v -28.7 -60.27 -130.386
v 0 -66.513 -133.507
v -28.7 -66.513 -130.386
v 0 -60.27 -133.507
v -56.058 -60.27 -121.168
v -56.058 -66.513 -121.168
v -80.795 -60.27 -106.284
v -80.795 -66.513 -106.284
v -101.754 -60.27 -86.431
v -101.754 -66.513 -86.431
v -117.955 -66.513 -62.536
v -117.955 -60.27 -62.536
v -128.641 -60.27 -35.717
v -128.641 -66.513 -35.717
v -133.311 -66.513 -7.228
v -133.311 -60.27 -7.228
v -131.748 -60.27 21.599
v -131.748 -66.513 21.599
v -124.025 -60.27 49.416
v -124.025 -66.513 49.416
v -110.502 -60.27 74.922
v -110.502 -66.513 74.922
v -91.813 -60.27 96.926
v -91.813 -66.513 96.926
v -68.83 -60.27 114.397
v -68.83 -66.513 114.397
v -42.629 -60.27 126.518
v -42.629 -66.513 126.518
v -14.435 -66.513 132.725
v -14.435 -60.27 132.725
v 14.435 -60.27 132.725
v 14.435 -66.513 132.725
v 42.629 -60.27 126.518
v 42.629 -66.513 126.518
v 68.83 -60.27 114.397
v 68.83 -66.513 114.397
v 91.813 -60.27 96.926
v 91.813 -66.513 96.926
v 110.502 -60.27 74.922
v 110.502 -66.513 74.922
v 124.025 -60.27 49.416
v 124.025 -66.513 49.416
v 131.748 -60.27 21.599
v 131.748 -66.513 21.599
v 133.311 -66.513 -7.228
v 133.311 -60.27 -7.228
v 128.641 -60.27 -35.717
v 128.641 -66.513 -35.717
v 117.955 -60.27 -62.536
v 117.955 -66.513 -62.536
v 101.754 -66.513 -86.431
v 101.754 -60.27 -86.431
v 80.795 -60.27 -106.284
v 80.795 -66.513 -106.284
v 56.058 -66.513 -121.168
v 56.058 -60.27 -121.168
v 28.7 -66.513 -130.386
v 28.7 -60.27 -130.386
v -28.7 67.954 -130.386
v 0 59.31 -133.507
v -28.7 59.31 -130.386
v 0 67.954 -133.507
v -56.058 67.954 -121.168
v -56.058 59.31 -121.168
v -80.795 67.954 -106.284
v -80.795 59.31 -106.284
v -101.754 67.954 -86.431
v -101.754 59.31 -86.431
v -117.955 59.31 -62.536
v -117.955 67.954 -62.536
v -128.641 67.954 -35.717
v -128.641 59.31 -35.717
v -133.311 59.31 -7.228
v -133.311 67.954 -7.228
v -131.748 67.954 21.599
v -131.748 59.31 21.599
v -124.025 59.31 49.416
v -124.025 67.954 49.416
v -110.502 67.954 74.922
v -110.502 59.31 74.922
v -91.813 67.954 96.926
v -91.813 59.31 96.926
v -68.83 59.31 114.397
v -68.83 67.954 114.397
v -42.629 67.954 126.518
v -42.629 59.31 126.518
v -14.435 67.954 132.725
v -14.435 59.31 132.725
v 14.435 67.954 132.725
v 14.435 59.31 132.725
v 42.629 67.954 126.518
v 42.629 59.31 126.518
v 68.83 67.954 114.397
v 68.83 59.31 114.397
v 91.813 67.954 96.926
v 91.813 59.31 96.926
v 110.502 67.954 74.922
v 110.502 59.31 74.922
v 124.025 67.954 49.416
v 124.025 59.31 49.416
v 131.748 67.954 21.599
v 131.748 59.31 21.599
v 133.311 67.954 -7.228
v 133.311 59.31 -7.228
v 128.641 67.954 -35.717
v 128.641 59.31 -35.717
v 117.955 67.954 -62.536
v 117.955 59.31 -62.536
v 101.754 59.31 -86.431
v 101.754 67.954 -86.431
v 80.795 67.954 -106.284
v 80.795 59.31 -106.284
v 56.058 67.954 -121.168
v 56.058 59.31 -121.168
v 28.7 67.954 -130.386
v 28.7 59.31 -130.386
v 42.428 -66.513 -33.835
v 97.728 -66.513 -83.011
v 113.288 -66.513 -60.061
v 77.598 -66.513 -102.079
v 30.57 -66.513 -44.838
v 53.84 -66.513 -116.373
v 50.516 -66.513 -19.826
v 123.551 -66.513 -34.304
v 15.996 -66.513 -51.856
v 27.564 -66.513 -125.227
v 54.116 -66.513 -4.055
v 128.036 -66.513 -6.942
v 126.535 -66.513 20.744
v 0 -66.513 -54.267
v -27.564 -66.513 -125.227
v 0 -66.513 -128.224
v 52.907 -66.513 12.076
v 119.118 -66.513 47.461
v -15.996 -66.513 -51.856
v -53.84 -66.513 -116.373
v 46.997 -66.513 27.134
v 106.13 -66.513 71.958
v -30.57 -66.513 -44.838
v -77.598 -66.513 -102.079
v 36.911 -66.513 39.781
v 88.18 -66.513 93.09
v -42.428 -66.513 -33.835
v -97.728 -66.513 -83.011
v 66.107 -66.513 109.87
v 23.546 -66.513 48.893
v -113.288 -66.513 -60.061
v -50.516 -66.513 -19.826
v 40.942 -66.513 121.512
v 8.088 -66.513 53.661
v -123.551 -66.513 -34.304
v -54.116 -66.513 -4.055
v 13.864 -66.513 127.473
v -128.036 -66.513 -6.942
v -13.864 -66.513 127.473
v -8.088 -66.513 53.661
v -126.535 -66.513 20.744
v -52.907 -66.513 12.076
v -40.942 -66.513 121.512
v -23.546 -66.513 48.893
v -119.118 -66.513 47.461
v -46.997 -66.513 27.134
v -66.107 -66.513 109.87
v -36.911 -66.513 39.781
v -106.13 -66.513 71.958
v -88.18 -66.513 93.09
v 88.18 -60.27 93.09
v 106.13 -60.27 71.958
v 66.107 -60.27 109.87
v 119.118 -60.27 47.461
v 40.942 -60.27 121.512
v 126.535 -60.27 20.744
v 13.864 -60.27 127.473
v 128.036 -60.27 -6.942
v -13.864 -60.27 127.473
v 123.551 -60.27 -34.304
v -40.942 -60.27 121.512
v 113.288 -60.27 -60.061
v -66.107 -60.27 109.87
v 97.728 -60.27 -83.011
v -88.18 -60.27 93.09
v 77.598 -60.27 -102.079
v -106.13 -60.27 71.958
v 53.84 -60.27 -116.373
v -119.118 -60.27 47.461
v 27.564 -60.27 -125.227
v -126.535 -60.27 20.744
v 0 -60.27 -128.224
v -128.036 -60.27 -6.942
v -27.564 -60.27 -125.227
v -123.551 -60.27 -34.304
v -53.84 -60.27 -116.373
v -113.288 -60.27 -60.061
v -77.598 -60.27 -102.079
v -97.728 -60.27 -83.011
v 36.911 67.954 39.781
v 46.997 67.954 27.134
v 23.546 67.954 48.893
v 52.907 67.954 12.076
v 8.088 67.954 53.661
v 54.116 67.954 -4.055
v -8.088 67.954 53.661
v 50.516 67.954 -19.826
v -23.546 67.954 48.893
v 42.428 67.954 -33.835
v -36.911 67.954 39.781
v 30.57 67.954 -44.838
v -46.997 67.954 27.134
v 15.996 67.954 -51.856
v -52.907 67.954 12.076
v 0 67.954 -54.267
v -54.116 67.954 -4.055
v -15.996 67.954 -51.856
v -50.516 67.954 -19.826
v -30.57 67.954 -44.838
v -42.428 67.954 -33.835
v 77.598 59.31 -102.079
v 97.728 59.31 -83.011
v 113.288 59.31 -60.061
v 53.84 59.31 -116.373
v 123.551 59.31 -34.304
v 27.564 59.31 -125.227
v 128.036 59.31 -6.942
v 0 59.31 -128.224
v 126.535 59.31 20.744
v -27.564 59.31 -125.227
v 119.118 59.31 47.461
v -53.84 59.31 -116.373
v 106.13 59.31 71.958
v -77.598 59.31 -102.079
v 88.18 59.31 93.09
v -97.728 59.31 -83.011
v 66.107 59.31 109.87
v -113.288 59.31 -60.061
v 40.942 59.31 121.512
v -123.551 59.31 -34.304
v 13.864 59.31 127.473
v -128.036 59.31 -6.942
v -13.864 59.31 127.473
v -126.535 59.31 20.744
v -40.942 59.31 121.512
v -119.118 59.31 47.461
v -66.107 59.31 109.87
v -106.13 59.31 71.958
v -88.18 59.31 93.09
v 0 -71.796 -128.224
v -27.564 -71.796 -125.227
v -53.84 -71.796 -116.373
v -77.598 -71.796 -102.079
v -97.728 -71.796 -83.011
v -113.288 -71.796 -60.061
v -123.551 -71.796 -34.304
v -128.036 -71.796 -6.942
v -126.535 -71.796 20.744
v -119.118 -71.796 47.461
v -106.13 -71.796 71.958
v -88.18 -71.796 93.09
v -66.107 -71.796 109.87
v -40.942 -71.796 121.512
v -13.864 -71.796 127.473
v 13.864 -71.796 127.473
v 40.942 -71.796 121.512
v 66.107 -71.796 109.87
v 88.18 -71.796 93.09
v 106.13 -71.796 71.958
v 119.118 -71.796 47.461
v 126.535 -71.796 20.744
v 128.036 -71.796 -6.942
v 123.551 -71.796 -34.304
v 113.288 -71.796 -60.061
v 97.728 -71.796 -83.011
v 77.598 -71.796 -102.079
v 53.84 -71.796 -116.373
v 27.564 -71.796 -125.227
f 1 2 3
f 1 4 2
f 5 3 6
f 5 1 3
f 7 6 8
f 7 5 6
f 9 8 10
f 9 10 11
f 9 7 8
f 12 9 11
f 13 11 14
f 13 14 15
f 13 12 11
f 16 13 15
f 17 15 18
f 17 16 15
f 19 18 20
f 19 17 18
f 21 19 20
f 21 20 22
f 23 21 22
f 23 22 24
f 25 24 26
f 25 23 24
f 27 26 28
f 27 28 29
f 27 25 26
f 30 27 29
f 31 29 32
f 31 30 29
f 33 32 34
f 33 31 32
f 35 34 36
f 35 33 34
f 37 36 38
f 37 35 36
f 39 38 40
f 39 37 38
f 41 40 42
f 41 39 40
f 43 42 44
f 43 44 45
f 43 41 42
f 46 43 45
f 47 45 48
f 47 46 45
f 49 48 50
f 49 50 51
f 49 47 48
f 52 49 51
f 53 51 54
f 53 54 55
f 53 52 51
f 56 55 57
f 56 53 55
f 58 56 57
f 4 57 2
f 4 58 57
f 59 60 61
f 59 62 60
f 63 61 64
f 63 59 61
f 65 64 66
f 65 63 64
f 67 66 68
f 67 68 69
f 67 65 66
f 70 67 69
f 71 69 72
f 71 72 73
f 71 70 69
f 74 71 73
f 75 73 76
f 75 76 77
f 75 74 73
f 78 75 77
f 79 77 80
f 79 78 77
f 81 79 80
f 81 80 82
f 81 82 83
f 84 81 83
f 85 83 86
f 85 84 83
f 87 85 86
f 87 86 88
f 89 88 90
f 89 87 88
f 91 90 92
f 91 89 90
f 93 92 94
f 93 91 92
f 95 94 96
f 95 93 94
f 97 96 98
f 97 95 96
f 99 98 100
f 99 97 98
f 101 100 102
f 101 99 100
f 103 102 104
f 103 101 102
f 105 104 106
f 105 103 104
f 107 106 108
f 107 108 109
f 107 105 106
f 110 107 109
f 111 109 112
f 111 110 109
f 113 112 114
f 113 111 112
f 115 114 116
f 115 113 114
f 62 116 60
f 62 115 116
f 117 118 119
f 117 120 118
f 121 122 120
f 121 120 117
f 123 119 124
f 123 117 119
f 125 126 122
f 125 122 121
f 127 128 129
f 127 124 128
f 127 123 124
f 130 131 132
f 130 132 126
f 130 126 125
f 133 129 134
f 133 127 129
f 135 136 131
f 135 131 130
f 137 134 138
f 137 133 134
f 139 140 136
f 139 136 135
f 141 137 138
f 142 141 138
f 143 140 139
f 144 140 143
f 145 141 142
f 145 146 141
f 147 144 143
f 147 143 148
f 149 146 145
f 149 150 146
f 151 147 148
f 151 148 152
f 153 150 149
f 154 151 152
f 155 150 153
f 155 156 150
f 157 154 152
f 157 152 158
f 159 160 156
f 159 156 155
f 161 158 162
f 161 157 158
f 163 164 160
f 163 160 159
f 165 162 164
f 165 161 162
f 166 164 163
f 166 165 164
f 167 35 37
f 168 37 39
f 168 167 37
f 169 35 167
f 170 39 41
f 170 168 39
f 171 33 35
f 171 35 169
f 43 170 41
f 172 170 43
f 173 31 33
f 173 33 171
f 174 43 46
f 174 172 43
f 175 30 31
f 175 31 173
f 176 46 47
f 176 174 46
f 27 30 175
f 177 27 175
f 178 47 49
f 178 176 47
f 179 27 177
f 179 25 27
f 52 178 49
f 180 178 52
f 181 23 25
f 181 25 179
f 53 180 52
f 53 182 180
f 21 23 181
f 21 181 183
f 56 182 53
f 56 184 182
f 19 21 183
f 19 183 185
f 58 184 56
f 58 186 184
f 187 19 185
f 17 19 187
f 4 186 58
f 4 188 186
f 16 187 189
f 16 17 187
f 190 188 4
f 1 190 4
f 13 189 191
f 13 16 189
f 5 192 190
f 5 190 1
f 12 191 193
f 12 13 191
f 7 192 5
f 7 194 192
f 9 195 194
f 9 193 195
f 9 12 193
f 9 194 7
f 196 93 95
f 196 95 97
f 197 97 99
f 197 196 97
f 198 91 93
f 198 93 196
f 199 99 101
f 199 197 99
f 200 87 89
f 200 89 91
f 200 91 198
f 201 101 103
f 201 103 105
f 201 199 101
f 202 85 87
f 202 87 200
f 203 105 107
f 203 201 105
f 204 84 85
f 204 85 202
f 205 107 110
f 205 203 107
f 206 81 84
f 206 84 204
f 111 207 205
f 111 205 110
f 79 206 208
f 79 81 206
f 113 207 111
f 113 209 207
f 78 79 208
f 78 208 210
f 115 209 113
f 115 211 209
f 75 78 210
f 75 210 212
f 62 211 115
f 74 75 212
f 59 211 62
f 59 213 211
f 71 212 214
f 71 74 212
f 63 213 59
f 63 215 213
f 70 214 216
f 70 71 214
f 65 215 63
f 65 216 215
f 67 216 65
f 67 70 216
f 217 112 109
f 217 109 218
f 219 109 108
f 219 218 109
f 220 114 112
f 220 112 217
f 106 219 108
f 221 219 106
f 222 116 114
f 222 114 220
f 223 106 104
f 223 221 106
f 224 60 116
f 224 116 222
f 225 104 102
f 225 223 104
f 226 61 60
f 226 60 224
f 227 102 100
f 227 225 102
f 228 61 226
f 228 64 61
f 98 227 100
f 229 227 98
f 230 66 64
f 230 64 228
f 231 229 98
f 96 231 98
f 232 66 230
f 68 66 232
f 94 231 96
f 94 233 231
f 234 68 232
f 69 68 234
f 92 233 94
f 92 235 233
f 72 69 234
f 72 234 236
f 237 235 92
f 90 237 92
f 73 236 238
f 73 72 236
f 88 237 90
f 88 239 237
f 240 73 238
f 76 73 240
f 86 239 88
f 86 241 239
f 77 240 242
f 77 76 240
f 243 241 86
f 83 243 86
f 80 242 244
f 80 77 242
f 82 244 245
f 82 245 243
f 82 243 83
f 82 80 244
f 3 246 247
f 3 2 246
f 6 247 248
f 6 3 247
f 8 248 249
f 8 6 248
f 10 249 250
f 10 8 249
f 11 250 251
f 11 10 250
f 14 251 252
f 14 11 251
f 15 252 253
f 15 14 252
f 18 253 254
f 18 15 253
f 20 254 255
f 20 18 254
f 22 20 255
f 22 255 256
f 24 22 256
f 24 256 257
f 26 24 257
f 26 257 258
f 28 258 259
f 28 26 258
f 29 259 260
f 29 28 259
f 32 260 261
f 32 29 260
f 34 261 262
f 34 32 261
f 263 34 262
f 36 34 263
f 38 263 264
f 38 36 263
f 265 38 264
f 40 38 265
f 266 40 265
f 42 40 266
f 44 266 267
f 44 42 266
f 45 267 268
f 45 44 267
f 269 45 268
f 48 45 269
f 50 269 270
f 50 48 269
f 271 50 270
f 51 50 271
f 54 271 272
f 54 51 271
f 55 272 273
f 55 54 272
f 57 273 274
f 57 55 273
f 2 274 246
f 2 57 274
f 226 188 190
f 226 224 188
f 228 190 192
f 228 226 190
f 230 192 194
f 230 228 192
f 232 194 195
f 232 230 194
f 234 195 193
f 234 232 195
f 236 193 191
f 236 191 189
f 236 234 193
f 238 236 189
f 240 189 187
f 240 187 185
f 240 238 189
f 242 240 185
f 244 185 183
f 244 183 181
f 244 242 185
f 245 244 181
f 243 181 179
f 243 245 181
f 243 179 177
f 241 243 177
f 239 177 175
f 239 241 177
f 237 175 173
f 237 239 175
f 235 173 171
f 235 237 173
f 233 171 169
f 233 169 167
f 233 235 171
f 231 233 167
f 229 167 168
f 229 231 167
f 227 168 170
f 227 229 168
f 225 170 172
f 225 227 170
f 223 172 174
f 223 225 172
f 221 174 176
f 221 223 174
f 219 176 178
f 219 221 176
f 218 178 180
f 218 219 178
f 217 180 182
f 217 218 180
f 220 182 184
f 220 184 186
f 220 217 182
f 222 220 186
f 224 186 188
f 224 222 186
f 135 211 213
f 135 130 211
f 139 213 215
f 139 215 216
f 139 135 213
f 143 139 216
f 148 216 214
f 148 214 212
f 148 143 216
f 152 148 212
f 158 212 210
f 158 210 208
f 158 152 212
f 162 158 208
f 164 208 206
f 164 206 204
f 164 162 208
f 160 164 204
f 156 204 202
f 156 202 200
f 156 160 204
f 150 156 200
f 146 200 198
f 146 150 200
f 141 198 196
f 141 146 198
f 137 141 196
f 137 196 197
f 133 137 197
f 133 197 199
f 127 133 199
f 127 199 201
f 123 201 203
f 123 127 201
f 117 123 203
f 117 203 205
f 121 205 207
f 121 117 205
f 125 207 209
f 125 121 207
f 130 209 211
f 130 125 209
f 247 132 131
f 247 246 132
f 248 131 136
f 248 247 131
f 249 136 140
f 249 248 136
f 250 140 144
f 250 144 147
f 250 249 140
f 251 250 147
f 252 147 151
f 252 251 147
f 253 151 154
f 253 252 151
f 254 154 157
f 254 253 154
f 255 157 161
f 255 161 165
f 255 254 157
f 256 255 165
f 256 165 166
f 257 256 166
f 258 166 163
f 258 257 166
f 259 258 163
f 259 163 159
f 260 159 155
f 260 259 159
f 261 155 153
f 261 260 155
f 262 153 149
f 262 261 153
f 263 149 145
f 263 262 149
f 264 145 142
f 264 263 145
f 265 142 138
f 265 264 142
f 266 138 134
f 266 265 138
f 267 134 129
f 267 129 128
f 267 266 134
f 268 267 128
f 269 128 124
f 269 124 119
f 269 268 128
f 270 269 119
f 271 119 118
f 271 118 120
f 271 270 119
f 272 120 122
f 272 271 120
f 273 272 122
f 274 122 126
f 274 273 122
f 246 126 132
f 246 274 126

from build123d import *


with BuildPart() as part:
    # Croquis1 → Revolución1 (revolve)
    with BuildSketch(Plane(origin=(0, 0, 0), x_dir=(0, 0, -1), z_dir=(1, 0, 0))):
        Polygon((54.267285515, 67.95416726), (54.267285515, -66.513442866), (128.224471084, -66.513442866), (128.224471084, -60.270303824), (128.224471084, 59.309820895), (133.507127196, 59.309820895), (133.507127196, 67.95416726), align=None)
        Polygon((128.224471084, -60.270303824), (128.224471084, -66.513442866), (128.224471084, -71.796098978), (133.507127196, -66.513442866), (133.507127196, -60.270303824), align=None)
    revolve(axis=Axis((0, -66.513442866, 0), (0, 1, 0)))


solid = part.part
